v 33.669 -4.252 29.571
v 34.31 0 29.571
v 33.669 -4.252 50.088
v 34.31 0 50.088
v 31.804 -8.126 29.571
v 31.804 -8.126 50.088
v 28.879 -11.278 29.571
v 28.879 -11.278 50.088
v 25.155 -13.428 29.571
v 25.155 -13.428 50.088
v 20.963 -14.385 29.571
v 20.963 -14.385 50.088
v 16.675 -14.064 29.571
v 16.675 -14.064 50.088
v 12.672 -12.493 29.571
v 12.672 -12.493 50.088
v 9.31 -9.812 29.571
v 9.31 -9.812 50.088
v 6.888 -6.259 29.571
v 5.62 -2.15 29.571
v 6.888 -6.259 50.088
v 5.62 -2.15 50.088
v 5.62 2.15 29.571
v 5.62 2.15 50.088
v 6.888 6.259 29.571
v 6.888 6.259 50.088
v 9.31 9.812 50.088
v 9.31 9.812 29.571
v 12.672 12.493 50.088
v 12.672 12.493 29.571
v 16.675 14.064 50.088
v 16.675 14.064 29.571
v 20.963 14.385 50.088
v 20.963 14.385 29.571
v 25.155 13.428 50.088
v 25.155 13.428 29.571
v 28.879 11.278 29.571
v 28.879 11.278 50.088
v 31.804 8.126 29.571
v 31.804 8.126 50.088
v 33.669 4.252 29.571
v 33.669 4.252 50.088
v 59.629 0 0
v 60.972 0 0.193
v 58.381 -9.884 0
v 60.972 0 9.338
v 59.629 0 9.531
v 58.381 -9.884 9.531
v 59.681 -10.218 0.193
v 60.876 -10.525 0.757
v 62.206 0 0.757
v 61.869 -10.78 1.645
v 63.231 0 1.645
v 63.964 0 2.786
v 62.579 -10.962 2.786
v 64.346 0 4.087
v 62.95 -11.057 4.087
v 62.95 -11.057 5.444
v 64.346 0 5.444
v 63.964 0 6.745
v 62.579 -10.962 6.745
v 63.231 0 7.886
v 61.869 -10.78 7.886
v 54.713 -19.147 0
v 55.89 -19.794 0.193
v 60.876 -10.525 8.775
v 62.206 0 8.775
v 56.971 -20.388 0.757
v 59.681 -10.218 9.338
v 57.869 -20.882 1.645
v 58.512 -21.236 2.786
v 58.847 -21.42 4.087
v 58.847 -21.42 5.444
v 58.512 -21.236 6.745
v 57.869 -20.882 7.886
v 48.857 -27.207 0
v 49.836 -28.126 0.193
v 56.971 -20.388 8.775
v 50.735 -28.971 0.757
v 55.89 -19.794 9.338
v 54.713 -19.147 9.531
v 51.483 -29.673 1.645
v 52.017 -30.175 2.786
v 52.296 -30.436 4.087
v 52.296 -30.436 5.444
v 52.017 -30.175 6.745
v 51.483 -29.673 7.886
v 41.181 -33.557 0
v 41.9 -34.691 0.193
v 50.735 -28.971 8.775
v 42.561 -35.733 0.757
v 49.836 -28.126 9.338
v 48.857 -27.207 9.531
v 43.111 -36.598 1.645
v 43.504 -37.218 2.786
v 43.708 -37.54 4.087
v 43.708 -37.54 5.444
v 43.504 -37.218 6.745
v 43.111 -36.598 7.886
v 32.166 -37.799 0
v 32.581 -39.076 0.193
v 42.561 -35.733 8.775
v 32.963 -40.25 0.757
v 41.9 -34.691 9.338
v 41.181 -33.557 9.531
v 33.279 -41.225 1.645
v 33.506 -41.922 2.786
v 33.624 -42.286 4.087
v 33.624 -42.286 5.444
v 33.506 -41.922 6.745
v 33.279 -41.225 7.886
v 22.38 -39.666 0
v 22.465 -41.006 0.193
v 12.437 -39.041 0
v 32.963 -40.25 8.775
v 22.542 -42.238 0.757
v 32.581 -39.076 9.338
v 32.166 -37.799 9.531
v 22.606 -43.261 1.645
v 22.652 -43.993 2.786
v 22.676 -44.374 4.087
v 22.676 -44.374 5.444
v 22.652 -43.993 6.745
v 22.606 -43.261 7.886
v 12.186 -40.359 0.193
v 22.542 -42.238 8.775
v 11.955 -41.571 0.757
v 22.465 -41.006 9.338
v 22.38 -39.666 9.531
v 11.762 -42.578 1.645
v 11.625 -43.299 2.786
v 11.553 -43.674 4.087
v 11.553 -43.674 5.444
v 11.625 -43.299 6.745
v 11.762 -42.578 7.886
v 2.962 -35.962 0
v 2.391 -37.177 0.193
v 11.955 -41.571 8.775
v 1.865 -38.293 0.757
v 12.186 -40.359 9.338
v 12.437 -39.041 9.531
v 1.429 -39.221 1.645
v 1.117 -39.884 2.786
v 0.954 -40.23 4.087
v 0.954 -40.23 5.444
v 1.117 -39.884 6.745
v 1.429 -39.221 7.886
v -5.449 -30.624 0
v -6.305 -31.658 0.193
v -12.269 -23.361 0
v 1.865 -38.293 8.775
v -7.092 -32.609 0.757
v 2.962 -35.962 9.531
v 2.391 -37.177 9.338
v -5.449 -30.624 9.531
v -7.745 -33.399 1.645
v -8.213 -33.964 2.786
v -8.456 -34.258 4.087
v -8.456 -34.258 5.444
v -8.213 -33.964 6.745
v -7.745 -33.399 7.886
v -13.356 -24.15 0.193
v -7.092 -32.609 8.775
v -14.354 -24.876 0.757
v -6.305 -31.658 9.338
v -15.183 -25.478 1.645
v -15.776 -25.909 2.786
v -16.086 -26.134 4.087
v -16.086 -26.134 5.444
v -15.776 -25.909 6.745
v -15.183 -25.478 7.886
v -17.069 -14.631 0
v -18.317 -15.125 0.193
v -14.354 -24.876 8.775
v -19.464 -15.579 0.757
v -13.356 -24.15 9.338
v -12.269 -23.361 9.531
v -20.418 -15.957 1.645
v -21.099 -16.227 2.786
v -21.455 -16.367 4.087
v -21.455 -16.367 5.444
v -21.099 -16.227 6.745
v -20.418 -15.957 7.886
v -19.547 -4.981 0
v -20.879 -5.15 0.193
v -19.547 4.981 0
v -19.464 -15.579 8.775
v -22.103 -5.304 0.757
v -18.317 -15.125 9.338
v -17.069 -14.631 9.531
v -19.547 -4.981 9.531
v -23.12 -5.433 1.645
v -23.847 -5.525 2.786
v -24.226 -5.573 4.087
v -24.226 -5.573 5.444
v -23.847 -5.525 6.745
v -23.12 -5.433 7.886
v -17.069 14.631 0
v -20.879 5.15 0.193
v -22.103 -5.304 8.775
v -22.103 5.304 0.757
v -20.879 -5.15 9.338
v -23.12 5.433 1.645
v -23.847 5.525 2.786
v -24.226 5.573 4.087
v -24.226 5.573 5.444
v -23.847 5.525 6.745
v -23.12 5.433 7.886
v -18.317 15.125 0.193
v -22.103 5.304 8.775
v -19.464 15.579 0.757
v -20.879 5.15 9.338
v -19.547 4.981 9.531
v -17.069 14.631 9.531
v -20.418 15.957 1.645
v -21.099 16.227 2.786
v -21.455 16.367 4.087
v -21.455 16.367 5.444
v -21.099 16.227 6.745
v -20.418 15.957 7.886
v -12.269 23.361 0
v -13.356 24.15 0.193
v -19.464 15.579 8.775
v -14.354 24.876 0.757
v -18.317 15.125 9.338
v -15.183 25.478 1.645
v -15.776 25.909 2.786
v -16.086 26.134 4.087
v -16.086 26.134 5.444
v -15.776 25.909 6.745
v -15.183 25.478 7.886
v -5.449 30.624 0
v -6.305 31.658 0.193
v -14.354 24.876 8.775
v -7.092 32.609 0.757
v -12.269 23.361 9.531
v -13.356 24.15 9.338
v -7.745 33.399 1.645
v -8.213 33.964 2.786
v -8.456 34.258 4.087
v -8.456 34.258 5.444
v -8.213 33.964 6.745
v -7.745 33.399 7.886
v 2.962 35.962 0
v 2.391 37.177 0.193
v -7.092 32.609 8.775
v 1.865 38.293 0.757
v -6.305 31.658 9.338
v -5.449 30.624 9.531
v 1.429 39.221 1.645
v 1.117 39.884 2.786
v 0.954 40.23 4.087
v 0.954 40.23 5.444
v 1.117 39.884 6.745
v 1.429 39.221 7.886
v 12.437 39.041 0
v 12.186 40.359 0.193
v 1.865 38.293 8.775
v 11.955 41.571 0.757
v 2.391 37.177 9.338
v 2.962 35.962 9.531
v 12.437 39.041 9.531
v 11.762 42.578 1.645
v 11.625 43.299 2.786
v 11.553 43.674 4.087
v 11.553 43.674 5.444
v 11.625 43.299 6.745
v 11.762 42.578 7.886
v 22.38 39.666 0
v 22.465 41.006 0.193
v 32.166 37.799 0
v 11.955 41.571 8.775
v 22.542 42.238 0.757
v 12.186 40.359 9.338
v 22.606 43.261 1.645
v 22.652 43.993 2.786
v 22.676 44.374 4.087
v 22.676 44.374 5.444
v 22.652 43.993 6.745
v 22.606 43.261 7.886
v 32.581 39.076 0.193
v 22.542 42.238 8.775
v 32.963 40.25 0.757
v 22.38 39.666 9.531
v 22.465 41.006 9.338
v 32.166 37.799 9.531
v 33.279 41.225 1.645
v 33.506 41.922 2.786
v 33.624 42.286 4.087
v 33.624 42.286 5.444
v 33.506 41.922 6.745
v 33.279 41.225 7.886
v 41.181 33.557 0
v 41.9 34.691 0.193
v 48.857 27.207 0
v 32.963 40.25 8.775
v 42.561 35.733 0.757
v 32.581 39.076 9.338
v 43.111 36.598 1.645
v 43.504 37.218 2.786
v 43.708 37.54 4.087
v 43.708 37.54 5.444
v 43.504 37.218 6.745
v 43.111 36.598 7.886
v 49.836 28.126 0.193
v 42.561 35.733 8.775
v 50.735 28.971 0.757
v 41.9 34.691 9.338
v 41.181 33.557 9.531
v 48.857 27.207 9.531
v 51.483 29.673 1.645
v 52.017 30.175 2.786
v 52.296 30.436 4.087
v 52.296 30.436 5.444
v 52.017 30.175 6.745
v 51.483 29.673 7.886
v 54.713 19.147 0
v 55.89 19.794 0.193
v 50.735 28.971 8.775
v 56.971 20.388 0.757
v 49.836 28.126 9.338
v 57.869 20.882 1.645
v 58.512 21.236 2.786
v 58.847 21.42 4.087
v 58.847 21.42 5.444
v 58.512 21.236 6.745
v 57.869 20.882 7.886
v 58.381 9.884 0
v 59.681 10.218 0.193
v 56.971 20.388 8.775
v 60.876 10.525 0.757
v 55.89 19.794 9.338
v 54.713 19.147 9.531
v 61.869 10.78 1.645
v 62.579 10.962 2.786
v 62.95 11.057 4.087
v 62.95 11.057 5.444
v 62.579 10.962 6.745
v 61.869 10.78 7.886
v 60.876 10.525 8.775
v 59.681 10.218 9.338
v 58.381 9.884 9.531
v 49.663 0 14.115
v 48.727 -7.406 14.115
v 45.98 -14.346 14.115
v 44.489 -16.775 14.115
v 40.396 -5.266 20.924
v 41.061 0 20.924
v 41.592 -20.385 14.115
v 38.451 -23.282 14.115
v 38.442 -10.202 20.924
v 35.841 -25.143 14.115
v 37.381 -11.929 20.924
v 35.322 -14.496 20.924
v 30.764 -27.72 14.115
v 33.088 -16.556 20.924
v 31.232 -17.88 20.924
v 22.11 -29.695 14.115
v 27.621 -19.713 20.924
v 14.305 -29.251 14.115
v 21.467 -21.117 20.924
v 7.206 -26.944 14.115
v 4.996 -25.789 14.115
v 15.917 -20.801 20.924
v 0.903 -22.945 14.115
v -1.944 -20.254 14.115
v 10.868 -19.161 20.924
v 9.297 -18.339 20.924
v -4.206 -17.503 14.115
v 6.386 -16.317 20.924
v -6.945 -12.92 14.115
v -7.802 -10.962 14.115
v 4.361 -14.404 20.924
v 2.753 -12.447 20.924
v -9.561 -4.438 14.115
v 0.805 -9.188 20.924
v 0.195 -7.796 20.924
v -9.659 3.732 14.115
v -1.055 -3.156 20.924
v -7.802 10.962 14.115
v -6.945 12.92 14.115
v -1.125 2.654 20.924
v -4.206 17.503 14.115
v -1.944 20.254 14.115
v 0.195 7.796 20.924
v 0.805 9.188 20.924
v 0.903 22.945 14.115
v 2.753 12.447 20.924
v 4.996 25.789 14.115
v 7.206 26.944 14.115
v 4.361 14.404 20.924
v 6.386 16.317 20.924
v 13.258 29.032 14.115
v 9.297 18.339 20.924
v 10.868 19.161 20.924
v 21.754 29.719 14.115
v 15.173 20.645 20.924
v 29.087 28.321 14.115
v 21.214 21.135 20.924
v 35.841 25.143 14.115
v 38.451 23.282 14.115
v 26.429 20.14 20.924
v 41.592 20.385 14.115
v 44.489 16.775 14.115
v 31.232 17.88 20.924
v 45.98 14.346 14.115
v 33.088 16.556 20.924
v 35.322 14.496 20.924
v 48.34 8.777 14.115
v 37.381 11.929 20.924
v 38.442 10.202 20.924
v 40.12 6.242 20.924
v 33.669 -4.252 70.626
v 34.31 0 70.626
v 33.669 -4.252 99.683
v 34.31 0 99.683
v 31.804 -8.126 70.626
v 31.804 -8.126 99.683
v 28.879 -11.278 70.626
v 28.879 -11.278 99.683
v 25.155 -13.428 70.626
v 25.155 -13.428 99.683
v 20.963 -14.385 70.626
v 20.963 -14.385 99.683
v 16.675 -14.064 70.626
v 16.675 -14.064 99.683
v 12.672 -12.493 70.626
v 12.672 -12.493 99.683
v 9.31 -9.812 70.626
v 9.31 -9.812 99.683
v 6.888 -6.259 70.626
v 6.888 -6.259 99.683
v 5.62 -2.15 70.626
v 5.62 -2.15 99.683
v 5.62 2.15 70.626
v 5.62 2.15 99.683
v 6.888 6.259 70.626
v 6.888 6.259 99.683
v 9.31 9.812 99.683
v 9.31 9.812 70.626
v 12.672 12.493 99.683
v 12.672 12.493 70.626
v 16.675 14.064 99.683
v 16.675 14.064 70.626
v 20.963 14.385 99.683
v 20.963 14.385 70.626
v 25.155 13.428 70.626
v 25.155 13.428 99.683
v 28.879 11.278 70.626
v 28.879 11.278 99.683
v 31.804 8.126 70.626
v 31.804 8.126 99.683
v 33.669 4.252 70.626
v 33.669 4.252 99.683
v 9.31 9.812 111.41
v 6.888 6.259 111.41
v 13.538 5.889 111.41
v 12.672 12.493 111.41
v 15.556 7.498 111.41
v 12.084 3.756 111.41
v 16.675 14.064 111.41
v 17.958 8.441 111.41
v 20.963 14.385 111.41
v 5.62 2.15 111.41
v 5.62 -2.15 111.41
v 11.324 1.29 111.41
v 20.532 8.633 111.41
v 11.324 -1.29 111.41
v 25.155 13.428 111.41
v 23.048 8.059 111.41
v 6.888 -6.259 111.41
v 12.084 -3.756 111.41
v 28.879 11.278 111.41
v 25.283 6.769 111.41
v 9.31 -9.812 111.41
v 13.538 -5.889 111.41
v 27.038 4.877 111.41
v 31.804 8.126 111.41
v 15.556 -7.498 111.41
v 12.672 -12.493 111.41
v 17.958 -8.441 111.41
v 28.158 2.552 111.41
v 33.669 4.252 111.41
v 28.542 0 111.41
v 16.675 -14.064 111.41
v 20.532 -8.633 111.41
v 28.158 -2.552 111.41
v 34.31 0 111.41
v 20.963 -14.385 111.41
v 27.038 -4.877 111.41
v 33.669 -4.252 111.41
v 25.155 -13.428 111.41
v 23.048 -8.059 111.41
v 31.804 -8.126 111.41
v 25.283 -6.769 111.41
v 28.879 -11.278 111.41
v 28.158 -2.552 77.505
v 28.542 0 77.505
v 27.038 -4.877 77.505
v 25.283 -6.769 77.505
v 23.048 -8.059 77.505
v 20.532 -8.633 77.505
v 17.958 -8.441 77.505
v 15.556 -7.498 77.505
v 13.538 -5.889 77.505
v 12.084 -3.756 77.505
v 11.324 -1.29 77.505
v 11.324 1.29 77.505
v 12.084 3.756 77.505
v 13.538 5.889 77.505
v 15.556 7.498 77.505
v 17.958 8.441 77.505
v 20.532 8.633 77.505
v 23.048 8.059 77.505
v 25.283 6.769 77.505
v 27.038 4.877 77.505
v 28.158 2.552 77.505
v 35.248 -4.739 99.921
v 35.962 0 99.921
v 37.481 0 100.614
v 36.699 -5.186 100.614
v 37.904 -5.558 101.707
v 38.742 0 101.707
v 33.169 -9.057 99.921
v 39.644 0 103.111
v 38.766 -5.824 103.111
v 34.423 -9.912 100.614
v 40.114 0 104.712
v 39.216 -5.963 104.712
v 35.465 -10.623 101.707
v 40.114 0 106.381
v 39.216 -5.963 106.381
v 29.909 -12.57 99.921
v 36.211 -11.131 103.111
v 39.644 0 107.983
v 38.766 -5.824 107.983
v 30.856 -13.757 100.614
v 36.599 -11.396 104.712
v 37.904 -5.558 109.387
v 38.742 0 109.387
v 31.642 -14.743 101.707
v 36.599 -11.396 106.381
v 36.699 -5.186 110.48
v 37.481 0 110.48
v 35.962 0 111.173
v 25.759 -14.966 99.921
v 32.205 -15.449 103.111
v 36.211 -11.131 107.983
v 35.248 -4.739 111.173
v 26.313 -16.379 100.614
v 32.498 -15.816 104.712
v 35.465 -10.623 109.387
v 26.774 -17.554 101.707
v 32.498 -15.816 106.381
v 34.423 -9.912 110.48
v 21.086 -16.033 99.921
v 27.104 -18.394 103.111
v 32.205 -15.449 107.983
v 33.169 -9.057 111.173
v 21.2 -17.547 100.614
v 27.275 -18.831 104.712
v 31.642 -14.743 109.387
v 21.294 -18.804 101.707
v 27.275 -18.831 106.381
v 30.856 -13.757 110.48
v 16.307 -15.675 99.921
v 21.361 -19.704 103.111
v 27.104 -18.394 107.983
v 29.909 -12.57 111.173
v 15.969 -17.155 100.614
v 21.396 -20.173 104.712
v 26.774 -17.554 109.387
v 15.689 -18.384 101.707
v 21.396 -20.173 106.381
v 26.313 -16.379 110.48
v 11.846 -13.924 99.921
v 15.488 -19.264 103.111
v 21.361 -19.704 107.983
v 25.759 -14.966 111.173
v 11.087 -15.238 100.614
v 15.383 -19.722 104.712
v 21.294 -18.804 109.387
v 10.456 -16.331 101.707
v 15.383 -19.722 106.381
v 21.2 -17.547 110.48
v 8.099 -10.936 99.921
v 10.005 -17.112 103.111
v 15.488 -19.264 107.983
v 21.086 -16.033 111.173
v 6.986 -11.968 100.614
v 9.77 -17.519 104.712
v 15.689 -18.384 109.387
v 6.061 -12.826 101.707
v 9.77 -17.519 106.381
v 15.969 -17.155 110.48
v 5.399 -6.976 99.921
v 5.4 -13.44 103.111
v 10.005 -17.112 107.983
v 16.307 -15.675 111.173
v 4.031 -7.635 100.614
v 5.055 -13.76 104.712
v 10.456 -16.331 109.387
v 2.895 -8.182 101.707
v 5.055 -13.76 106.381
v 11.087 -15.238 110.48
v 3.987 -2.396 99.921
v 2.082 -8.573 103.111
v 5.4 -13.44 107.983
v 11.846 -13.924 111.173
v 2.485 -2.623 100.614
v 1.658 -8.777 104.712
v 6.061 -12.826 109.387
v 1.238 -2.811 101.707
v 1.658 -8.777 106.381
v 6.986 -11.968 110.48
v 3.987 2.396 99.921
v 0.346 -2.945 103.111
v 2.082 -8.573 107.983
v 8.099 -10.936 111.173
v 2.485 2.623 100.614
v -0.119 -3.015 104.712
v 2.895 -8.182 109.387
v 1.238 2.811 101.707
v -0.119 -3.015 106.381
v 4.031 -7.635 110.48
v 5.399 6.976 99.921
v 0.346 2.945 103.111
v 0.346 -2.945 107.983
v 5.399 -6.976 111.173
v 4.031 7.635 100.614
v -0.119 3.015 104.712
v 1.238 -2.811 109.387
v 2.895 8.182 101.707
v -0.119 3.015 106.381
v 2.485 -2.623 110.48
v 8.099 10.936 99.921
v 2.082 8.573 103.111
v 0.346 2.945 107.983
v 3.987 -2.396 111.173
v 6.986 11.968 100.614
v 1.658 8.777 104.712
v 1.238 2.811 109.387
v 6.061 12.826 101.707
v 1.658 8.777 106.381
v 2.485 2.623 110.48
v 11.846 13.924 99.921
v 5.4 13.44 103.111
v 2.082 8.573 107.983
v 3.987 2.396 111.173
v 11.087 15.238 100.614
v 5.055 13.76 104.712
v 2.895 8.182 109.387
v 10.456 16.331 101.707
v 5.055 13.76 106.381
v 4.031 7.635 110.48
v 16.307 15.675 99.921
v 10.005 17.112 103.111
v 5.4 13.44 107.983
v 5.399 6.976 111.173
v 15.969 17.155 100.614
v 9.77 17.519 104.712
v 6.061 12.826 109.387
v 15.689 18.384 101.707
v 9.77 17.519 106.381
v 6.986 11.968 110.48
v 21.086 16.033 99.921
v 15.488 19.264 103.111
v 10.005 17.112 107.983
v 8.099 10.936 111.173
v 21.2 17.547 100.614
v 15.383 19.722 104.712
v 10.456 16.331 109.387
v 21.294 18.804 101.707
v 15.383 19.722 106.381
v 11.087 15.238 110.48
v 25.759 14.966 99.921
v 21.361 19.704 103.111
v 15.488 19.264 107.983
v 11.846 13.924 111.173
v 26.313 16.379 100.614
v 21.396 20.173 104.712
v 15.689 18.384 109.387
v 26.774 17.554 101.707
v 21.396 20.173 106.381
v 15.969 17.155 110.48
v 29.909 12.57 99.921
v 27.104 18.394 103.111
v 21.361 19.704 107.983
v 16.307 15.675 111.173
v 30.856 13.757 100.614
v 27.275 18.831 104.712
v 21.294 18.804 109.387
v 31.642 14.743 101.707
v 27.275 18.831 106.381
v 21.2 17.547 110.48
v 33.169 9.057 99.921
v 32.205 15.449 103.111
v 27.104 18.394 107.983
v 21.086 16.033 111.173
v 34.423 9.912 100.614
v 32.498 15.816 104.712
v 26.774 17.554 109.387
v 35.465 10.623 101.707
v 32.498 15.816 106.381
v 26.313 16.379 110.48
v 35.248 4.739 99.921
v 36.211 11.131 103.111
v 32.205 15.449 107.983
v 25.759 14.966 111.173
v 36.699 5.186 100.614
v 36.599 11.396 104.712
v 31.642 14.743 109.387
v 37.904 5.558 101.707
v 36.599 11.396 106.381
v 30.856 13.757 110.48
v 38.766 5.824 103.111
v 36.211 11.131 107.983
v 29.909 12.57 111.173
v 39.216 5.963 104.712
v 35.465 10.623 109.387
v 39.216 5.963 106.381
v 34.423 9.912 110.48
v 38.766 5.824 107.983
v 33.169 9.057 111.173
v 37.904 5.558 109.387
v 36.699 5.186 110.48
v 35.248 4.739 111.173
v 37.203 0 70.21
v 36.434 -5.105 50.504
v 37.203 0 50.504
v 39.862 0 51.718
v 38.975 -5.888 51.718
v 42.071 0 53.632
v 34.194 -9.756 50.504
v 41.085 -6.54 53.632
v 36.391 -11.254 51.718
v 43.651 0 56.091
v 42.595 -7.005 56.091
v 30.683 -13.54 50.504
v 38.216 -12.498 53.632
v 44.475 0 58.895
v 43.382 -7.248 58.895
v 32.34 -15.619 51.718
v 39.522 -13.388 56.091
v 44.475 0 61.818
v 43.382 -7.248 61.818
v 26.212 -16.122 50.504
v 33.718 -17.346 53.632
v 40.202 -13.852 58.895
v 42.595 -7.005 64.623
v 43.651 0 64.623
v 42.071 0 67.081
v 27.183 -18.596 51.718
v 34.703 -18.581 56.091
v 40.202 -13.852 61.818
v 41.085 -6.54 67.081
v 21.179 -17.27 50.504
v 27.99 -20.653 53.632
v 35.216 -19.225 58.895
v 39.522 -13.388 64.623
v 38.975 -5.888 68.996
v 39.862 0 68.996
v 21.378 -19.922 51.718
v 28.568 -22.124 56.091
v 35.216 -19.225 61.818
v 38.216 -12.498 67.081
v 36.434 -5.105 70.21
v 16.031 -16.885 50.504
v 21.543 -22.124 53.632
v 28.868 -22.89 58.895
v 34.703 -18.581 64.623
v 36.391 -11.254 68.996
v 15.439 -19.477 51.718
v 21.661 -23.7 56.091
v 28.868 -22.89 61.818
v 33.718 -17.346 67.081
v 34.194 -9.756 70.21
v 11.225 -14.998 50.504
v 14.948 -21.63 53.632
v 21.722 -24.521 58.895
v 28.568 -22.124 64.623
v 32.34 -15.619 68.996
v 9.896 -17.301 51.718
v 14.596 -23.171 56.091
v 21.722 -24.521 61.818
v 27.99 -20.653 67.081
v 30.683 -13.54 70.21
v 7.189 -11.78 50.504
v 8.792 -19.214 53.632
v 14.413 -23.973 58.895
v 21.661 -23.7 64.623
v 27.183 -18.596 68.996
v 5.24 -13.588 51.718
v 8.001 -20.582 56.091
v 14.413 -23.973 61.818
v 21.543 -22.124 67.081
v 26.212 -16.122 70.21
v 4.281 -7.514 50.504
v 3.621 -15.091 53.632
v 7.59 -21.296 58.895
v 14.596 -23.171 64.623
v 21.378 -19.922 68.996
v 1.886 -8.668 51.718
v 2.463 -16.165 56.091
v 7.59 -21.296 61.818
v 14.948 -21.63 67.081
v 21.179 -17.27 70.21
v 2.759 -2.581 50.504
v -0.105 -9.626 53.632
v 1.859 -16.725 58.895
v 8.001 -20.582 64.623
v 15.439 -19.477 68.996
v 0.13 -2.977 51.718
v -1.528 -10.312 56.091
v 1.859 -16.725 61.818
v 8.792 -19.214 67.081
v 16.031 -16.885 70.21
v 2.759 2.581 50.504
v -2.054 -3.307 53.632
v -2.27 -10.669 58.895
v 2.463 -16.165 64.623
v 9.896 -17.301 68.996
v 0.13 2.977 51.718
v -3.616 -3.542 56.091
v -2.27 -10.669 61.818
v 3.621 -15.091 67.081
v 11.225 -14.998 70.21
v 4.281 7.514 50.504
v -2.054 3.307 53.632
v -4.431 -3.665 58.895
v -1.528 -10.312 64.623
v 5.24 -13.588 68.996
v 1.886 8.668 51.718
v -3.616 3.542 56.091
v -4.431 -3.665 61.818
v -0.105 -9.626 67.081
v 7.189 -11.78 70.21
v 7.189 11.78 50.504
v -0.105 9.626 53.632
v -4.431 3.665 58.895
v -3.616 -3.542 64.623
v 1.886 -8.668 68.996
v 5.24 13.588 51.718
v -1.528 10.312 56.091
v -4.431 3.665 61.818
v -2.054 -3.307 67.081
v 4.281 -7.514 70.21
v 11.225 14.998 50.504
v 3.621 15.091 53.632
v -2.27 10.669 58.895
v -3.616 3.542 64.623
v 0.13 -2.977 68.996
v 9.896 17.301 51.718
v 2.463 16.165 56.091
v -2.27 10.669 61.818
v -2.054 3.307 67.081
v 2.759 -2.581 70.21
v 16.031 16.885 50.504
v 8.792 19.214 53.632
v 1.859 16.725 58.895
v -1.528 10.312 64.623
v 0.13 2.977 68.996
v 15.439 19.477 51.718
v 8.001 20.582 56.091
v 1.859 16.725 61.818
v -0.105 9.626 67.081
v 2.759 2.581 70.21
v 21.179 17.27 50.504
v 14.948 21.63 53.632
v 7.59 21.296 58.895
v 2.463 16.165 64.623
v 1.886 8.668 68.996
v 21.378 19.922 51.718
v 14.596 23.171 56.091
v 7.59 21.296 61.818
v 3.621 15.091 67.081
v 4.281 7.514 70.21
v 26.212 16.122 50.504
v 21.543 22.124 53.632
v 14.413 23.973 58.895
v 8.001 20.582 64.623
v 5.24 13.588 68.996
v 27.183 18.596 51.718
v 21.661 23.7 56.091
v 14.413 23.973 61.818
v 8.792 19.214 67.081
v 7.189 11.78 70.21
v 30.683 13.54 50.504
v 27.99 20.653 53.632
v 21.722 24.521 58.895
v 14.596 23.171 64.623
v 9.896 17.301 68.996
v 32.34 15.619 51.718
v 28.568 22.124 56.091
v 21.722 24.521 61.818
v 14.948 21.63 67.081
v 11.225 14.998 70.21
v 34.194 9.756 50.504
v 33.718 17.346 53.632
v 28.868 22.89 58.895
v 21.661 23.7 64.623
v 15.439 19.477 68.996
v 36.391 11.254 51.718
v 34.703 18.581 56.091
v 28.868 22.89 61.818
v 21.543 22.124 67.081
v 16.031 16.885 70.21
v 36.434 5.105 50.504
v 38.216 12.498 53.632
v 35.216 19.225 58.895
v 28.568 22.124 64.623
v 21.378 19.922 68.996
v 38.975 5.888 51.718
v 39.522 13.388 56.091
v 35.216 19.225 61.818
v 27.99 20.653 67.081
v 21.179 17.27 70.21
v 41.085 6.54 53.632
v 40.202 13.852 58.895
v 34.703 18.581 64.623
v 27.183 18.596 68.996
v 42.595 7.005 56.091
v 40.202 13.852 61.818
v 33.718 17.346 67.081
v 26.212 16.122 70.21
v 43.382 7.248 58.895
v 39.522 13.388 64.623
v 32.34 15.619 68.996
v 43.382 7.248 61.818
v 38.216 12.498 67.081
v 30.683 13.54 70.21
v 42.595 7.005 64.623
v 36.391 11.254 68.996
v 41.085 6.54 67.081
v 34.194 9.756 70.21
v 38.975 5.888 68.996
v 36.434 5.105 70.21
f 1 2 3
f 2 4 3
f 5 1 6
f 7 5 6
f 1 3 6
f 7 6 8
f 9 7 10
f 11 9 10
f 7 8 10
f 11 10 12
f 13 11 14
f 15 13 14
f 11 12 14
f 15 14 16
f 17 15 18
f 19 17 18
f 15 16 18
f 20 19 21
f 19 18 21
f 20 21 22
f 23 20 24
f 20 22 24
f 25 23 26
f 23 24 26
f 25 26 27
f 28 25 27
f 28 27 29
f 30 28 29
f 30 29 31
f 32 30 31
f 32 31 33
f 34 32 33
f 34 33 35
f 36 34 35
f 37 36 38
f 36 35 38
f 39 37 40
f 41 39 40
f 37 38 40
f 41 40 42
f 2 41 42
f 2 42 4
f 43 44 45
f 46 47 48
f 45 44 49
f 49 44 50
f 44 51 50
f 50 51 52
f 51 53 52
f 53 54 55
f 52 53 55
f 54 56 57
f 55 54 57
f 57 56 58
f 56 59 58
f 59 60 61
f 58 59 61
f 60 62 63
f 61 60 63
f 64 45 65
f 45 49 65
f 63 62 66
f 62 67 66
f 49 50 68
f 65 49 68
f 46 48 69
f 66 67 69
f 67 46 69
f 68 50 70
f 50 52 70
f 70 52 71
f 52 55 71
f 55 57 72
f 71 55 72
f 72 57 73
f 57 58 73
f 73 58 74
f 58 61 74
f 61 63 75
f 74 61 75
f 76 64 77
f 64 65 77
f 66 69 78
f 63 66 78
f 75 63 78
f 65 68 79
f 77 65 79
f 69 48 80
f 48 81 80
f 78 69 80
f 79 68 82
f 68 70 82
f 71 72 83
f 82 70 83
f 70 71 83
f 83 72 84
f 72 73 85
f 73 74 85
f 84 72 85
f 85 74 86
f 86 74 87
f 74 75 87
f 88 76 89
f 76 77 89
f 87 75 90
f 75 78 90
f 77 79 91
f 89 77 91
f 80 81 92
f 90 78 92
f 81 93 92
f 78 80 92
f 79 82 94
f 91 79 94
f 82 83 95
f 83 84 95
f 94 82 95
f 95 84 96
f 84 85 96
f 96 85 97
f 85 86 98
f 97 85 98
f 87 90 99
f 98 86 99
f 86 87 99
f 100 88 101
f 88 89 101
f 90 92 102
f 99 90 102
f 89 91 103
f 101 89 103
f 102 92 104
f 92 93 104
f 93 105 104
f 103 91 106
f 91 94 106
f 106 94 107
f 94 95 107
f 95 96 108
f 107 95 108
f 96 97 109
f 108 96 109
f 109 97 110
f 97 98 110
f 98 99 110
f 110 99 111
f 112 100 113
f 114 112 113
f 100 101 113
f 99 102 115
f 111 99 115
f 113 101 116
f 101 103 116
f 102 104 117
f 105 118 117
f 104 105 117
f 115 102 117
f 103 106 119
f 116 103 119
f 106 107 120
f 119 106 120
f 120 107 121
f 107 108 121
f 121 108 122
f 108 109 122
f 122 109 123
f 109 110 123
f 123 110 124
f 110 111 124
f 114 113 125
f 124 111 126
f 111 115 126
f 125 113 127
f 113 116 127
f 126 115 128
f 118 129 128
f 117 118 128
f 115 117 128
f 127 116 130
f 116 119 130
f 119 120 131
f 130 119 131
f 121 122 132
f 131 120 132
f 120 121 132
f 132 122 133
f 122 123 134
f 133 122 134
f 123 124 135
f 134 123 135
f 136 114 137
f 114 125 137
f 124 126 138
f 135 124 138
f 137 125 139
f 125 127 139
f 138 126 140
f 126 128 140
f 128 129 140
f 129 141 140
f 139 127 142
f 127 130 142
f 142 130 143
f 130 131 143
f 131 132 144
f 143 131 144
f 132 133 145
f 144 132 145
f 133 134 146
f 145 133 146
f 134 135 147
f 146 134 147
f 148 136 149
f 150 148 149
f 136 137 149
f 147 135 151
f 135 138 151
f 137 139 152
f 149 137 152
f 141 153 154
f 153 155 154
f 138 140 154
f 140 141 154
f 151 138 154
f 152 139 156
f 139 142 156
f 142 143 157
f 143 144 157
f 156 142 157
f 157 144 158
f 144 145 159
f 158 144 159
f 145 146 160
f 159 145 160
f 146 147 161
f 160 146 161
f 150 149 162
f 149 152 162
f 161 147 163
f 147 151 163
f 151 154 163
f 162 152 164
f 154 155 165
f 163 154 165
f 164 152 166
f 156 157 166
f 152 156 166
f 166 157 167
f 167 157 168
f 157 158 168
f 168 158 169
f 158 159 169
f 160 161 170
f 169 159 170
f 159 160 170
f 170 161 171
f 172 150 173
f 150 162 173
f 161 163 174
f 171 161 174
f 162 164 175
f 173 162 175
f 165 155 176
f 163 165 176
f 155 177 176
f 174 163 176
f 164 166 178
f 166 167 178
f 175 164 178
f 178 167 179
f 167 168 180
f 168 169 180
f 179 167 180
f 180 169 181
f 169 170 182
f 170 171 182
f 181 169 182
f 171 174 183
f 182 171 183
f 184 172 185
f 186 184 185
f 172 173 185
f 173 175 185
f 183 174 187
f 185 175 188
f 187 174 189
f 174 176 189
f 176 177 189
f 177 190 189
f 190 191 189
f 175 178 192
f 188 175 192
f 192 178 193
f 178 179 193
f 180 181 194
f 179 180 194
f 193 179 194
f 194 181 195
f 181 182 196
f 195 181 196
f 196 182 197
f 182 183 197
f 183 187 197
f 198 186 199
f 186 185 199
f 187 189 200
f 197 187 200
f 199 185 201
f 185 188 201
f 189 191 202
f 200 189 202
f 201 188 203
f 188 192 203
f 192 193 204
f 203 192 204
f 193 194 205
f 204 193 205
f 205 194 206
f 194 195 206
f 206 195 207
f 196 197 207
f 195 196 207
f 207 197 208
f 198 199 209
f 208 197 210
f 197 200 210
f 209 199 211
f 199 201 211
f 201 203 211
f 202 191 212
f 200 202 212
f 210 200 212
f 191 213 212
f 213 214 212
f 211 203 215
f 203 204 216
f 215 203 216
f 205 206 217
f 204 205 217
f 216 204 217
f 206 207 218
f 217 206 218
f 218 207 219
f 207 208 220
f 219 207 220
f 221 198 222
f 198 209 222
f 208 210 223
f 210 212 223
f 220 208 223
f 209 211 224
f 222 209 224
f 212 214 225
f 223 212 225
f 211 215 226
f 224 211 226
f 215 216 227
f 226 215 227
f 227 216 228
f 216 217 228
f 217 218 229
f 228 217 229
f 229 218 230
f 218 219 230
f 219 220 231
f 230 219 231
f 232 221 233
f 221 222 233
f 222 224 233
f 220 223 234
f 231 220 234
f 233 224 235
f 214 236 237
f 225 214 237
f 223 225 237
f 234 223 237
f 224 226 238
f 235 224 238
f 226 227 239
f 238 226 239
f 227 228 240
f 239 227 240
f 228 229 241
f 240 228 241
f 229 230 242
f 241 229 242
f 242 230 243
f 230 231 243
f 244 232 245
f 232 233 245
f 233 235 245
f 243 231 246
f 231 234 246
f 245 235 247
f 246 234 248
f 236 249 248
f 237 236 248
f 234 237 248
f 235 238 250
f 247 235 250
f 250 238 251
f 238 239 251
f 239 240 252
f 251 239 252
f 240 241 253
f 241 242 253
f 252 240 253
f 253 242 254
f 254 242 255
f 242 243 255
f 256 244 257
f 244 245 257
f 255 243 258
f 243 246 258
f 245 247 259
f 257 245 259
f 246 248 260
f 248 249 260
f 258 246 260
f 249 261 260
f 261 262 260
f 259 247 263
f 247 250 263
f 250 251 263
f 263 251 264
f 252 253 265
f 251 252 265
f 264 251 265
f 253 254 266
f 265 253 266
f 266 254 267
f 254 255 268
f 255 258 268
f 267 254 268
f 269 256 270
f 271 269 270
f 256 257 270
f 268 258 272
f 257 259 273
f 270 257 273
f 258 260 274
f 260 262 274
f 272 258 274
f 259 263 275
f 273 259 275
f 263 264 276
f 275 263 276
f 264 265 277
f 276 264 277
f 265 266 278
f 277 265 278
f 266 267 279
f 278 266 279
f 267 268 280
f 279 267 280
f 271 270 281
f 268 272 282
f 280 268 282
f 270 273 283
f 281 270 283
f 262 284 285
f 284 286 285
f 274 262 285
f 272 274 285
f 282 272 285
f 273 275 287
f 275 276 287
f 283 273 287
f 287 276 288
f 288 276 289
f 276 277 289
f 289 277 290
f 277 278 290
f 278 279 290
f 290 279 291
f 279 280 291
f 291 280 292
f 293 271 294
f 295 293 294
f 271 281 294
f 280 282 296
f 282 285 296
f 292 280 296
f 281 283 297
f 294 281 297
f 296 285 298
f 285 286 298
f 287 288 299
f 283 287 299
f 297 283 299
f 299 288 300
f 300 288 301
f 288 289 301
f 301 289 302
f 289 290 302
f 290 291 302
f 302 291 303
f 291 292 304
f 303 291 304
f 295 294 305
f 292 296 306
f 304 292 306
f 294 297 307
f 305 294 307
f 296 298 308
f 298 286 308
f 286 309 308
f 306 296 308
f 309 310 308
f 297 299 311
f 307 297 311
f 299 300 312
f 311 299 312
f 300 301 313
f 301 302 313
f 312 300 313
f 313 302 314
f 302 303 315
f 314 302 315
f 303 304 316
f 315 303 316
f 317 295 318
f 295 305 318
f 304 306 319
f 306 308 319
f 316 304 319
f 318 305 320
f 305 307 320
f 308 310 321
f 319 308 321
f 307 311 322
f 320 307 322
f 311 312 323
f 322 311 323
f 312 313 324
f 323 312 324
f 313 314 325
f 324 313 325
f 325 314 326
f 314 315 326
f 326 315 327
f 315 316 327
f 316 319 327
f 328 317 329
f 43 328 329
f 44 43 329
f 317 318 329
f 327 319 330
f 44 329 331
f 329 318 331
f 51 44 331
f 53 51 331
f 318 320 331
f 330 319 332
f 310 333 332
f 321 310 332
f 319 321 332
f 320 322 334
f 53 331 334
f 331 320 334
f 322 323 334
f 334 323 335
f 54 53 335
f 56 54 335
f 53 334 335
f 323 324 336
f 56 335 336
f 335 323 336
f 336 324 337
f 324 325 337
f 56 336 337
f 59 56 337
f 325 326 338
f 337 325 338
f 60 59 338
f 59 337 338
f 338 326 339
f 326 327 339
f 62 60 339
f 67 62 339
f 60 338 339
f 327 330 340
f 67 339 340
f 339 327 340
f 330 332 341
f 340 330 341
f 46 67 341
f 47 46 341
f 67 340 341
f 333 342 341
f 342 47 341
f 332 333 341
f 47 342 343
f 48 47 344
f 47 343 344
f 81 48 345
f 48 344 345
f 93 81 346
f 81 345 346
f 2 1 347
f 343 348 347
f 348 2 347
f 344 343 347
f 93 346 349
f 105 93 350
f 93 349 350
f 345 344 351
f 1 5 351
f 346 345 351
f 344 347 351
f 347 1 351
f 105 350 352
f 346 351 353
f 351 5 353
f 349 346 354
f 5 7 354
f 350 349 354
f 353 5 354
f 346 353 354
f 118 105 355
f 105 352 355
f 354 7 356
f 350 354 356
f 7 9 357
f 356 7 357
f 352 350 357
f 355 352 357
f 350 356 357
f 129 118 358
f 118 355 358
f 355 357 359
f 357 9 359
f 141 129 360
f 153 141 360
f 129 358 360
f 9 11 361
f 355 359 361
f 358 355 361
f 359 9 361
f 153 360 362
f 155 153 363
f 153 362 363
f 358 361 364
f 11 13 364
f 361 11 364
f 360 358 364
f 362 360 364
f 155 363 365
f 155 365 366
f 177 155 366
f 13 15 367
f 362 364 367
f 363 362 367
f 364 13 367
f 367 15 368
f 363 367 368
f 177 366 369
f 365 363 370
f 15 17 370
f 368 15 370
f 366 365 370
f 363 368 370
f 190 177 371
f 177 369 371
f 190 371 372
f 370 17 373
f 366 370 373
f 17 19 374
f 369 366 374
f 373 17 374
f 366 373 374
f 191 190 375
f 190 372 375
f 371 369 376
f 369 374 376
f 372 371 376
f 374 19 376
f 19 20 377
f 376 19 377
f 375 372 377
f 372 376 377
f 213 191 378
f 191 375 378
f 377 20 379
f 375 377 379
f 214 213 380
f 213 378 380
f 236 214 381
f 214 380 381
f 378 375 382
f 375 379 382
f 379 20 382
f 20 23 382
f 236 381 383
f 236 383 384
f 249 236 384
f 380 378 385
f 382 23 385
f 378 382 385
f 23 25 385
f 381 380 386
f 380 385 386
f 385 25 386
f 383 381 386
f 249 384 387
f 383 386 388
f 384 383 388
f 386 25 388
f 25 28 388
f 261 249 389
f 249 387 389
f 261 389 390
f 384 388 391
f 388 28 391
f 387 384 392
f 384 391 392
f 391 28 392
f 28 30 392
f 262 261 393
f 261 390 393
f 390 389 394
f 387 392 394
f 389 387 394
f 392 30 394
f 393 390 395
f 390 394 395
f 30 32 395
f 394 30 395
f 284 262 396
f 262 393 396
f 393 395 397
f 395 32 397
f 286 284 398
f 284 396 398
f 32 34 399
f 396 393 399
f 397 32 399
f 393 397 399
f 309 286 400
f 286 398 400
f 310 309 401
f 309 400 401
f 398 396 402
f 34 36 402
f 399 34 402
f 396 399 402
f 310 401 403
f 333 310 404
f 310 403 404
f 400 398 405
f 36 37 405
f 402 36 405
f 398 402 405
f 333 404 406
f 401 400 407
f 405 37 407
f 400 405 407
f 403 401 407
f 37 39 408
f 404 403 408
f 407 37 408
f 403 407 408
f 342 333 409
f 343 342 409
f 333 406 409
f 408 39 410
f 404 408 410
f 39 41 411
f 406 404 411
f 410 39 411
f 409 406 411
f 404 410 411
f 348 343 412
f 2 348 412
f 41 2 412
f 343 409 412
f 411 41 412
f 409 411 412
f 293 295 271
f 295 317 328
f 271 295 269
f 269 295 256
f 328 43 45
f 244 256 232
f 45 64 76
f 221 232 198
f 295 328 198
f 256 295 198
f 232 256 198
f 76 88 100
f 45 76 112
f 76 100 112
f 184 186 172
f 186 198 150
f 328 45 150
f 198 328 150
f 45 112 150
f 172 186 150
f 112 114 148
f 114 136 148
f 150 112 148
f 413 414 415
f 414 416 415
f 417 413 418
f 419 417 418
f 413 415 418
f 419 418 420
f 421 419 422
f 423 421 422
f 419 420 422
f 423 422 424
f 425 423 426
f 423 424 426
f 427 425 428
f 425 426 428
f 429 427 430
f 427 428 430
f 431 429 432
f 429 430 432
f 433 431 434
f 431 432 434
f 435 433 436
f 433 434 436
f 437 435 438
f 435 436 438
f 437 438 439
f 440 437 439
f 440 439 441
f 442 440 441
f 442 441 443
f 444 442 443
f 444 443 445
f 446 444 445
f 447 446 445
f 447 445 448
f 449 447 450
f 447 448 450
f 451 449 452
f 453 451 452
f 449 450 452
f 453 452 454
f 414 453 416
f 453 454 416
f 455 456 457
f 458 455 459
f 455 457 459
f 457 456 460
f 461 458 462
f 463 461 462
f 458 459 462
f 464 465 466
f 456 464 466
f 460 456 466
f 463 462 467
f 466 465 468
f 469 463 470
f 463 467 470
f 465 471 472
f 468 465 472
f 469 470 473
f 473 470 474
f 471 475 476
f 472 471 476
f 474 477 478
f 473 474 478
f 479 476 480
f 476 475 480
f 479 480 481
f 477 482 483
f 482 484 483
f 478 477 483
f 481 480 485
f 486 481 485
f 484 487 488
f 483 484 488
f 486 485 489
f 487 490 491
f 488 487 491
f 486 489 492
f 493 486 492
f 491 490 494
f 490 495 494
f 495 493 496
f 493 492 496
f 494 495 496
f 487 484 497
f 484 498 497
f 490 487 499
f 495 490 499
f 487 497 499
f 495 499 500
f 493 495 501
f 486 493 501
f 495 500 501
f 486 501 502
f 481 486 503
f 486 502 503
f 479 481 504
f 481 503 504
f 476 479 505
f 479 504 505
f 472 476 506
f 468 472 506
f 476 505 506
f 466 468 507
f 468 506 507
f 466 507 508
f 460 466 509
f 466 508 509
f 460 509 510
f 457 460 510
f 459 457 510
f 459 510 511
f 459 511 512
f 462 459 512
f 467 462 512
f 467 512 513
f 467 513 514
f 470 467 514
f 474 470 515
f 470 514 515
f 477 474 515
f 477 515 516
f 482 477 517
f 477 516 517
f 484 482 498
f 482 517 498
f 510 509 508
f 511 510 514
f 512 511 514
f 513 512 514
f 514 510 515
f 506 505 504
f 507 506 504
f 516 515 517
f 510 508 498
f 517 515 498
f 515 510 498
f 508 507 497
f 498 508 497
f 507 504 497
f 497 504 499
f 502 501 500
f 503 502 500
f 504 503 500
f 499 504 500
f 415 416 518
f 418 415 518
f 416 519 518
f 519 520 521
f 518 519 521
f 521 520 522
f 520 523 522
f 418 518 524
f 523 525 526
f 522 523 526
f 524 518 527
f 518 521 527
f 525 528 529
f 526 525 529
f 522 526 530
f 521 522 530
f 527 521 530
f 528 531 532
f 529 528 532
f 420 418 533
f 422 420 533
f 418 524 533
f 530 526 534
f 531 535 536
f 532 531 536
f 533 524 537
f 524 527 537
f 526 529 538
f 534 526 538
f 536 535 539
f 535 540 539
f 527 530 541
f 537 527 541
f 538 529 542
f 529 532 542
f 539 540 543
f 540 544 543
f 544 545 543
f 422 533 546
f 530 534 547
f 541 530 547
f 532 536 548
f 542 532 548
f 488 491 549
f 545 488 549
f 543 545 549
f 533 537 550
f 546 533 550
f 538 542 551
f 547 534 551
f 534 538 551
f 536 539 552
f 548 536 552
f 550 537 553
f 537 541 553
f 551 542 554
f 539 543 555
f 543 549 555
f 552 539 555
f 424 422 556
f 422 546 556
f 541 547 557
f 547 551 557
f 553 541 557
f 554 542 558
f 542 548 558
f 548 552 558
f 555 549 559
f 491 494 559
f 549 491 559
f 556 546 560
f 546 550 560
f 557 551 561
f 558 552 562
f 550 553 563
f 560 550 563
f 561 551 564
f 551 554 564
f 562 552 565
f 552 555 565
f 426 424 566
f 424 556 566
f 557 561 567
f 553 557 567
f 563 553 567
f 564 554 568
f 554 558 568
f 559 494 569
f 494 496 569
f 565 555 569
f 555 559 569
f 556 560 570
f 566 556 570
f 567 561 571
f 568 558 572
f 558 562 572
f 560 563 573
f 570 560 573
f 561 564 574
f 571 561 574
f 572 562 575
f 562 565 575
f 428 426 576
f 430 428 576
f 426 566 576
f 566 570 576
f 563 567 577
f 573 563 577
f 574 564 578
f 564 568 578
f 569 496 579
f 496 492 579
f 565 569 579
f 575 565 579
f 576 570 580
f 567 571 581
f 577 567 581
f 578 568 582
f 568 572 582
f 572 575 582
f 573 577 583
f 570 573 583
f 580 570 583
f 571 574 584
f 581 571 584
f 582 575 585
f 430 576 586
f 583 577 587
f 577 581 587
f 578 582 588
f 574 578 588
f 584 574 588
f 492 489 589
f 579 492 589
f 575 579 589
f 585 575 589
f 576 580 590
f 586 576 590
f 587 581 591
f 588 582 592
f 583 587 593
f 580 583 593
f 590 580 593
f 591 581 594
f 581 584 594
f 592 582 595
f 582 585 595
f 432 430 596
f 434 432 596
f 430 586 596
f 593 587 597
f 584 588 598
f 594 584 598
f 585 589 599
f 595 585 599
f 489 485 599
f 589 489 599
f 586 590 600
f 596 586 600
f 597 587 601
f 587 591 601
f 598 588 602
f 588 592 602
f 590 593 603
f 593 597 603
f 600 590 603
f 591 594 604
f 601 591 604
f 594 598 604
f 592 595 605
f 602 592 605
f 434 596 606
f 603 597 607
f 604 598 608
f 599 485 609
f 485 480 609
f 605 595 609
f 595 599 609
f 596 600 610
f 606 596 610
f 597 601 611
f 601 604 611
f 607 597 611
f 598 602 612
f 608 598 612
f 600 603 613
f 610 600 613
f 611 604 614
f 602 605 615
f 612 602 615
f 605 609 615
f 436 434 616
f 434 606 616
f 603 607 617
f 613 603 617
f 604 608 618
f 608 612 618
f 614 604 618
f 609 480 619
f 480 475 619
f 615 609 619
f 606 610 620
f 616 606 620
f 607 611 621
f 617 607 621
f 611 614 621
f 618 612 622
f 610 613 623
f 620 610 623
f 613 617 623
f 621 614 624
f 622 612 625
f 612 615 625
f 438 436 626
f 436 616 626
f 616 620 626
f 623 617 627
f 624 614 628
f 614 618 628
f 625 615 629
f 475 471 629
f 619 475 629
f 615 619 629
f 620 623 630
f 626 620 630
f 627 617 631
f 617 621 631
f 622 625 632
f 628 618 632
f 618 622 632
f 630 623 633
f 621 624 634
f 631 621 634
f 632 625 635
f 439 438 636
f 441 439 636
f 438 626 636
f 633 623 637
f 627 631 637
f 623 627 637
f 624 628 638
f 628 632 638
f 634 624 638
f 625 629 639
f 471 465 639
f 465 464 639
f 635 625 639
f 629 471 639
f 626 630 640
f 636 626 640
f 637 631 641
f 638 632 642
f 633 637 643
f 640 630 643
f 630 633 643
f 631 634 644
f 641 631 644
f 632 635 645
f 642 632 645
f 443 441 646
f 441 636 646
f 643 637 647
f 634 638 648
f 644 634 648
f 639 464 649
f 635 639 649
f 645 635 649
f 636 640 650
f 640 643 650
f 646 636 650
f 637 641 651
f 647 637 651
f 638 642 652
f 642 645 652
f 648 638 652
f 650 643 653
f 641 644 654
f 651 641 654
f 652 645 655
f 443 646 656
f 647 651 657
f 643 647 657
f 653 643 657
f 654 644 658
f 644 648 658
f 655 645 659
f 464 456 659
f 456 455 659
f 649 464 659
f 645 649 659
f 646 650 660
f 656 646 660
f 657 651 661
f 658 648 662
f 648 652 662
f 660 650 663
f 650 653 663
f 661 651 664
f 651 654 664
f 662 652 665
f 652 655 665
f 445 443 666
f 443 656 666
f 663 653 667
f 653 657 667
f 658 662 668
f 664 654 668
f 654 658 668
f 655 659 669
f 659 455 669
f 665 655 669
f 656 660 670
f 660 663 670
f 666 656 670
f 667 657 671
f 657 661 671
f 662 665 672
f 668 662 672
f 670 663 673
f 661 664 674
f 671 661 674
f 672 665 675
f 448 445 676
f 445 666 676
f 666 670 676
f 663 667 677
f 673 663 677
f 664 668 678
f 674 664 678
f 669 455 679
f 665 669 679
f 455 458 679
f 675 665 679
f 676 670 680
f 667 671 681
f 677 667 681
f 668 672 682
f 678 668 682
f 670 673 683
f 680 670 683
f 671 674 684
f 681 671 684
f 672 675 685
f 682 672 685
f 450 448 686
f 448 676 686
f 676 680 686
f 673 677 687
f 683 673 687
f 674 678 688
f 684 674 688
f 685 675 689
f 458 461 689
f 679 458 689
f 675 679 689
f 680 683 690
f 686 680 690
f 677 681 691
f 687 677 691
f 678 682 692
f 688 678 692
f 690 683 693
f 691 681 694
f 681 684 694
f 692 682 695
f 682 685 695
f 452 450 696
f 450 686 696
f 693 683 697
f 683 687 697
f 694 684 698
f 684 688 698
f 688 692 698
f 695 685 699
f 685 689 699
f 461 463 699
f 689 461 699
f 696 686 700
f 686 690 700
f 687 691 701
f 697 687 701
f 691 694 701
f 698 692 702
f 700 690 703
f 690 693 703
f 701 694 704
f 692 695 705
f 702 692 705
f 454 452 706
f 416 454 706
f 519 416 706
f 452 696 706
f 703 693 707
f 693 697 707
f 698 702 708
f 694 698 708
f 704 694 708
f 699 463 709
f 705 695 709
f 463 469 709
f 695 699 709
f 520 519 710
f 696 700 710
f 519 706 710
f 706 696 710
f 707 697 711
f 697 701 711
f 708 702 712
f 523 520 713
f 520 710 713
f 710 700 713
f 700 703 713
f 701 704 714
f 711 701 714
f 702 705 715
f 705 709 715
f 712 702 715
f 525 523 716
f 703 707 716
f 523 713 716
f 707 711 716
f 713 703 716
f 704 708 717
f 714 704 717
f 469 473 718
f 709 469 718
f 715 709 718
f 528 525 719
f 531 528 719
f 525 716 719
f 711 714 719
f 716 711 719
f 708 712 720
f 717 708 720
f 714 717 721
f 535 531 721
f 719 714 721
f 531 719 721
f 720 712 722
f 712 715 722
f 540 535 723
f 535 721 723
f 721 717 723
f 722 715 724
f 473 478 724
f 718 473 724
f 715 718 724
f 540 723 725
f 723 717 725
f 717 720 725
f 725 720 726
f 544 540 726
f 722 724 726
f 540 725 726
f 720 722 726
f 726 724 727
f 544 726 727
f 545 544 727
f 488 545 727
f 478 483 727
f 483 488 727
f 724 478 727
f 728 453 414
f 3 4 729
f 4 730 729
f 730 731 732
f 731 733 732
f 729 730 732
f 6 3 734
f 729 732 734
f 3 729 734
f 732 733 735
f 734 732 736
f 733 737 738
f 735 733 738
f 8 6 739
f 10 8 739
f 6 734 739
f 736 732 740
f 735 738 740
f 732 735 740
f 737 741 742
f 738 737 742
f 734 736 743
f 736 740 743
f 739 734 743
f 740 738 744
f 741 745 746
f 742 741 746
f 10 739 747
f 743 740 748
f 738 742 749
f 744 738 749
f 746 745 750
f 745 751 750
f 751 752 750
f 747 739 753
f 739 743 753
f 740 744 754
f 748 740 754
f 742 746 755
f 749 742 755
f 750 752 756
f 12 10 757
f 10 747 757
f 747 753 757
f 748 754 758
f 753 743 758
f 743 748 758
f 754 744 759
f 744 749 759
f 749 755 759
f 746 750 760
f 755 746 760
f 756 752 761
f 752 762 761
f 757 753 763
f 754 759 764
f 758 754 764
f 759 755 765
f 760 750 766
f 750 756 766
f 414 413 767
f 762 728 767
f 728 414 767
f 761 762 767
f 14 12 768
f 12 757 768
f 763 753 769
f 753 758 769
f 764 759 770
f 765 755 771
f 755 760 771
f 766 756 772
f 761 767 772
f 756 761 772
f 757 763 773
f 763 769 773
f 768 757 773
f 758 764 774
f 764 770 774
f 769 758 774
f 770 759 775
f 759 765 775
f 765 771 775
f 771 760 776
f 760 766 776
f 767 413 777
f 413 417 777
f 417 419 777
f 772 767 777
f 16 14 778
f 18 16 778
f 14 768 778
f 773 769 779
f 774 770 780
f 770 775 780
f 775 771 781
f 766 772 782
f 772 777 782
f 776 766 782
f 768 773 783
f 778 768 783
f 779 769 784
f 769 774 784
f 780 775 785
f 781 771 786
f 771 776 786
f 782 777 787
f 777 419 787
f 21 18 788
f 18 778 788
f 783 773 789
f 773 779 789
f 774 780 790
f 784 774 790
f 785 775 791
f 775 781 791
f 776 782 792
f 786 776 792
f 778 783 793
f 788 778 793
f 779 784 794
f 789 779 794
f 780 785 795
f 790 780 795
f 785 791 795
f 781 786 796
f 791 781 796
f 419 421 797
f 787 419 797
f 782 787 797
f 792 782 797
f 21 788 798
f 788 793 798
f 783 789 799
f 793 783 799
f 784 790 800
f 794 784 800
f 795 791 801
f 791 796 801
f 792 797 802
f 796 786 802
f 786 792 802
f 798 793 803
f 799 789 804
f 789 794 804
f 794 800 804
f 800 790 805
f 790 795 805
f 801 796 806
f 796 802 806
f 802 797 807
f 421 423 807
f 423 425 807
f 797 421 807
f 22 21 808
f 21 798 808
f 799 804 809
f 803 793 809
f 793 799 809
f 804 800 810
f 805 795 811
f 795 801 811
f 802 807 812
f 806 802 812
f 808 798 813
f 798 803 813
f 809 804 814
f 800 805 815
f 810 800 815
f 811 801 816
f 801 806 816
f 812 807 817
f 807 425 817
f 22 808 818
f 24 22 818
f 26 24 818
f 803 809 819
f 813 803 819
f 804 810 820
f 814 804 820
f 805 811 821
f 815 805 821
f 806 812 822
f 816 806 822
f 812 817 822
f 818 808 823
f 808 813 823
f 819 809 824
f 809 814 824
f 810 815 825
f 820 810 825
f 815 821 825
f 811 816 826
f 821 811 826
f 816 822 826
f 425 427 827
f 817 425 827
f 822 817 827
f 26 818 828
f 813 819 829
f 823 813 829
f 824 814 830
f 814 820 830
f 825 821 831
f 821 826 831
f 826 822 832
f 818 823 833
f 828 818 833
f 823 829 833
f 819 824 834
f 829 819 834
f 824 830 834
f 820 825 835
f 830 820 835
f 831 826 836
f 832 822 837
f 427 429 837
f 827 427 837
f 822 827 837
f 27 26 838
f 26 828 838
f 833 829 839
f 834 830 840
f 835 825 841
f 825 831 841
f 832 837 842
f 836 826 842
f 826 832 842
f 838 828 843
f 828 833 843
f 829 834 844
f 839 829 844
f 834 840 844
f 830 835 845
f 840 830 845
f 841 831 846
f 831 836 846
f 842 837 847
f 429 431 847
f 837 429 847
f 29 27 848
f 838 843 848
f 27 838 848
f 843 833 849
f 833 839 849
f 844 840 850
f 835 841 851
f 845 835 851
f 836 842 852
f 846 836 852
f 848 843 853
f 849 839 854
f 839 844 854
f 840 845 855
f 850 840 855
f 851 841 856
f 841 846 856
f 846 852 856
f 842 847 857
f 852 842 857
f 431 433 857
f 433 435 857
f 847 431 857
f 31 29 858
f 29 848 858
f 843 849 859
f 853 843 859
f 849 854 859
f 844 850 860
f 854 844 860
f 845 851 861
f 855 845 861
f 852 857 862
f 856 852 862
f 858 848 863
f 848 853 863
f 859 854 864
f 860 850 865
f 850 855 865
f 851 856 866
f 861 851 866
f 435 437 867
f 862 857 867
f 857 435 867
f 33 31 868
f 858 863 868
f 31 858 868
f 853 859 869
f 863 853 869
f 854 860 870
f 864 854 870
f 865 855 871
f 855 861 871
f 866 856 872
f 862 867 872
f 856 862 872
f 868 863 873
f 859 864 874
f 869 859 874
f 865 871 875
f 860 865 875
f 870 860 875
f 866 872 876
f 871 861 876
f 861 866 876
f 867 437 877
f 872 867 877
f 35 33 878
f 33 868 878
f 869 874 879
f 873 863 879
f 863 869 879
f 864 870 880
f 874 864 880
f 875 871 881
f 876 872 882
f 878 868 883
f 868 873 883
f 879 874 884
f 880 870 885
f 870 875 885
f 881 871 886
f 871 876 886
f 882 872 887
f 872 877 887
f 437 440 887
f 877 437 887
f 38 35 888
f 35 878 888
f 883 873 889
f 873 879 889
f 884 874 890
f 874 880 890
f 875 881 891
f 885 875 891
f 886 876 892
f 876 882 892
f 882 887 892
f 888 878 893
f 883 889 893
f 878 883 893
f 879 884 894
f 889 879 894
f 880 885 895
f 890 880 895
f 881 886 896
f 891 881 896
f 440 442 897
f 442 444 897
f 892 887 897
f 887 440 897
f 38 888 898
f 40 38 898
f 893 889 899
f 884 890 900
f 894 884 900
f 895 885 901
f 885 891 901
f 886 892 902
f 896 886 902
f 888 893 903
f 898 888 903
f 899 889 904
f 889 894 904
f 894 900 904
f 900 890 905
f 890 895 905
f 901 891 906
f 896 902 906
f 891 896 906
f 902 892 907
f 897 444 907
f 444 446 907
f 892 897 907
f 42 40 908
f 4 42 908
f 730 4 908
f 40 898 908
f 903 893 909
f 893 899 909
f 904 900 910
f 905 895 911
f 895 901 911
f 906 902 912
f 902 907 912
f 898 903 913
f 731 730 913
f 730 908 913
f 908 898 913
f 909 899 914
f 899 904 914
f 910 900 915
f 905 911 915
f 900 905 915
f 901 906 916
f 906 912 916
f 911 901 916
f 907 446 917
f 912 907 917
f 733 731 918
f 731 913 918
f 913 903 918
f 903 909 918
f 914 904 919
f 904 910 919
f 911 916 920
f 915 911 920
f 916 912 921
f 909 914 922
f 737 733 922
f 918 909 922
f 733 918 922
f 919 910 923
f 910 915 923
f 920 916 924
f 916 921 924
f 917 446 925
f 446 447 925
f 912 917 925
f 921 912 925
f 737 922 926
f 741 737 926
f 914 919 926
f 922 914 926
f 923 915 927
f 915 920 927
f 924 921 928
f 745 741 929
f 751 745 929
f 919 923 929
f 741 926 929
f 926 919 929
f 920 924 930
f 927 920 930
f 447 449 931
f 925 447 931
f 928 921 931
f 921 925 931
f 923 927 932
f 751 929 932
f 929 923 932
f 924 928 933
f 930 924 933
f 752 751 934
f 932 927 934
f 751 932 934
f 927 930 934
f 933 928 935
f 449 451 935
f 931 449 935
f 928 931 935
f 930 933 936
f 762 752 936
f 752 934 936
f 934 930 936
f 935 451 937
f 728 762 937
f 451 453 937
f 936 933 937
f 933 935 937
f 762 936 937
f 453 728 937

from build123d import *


with BuildPart() as f1:
    # F0 (on Front) → F1 (revolve)
    with BuildSketch(Plane.XZ):
        with BuildLine():
            Line((19.884694, 77.50541), (19.884694, 0))
            Line((19.884694, 0), (59.629317, 0))
            ThreePointArc((59.629317, 0), (64.394954, 4.765636), (59.629317, 9.531273))
            ThreePointArc((59.629317, 9.531273), (45.158864, 17.262962), (34.310384, 29.570825))
            Line((34.310384, 29.570825), (34.310384, 50.088052))
            ThreePointArc((34.310384, 50.088052), (44.579187, 60.356855), (34.310384, 70.625658))
            Line((34.310384, 70.625658), (34.310384, 99.683128))
            ThreePointArc((34.310384, 99.683128), (40.174043, 105.546787), (34.310384, 111.410446))
            Line((34.310384, 111.410446), (28.542275, 111.410446))
            Line((28.542275, 111.410446), (28.542275, 77.50541))
            Line((28.542275, 77.50541), (19.884694, 77.50541))
        make_face()
    revolve(axis=Axis((19.884694, 0, 38.752705), (0, 0, -1)))


solid = f1.part
